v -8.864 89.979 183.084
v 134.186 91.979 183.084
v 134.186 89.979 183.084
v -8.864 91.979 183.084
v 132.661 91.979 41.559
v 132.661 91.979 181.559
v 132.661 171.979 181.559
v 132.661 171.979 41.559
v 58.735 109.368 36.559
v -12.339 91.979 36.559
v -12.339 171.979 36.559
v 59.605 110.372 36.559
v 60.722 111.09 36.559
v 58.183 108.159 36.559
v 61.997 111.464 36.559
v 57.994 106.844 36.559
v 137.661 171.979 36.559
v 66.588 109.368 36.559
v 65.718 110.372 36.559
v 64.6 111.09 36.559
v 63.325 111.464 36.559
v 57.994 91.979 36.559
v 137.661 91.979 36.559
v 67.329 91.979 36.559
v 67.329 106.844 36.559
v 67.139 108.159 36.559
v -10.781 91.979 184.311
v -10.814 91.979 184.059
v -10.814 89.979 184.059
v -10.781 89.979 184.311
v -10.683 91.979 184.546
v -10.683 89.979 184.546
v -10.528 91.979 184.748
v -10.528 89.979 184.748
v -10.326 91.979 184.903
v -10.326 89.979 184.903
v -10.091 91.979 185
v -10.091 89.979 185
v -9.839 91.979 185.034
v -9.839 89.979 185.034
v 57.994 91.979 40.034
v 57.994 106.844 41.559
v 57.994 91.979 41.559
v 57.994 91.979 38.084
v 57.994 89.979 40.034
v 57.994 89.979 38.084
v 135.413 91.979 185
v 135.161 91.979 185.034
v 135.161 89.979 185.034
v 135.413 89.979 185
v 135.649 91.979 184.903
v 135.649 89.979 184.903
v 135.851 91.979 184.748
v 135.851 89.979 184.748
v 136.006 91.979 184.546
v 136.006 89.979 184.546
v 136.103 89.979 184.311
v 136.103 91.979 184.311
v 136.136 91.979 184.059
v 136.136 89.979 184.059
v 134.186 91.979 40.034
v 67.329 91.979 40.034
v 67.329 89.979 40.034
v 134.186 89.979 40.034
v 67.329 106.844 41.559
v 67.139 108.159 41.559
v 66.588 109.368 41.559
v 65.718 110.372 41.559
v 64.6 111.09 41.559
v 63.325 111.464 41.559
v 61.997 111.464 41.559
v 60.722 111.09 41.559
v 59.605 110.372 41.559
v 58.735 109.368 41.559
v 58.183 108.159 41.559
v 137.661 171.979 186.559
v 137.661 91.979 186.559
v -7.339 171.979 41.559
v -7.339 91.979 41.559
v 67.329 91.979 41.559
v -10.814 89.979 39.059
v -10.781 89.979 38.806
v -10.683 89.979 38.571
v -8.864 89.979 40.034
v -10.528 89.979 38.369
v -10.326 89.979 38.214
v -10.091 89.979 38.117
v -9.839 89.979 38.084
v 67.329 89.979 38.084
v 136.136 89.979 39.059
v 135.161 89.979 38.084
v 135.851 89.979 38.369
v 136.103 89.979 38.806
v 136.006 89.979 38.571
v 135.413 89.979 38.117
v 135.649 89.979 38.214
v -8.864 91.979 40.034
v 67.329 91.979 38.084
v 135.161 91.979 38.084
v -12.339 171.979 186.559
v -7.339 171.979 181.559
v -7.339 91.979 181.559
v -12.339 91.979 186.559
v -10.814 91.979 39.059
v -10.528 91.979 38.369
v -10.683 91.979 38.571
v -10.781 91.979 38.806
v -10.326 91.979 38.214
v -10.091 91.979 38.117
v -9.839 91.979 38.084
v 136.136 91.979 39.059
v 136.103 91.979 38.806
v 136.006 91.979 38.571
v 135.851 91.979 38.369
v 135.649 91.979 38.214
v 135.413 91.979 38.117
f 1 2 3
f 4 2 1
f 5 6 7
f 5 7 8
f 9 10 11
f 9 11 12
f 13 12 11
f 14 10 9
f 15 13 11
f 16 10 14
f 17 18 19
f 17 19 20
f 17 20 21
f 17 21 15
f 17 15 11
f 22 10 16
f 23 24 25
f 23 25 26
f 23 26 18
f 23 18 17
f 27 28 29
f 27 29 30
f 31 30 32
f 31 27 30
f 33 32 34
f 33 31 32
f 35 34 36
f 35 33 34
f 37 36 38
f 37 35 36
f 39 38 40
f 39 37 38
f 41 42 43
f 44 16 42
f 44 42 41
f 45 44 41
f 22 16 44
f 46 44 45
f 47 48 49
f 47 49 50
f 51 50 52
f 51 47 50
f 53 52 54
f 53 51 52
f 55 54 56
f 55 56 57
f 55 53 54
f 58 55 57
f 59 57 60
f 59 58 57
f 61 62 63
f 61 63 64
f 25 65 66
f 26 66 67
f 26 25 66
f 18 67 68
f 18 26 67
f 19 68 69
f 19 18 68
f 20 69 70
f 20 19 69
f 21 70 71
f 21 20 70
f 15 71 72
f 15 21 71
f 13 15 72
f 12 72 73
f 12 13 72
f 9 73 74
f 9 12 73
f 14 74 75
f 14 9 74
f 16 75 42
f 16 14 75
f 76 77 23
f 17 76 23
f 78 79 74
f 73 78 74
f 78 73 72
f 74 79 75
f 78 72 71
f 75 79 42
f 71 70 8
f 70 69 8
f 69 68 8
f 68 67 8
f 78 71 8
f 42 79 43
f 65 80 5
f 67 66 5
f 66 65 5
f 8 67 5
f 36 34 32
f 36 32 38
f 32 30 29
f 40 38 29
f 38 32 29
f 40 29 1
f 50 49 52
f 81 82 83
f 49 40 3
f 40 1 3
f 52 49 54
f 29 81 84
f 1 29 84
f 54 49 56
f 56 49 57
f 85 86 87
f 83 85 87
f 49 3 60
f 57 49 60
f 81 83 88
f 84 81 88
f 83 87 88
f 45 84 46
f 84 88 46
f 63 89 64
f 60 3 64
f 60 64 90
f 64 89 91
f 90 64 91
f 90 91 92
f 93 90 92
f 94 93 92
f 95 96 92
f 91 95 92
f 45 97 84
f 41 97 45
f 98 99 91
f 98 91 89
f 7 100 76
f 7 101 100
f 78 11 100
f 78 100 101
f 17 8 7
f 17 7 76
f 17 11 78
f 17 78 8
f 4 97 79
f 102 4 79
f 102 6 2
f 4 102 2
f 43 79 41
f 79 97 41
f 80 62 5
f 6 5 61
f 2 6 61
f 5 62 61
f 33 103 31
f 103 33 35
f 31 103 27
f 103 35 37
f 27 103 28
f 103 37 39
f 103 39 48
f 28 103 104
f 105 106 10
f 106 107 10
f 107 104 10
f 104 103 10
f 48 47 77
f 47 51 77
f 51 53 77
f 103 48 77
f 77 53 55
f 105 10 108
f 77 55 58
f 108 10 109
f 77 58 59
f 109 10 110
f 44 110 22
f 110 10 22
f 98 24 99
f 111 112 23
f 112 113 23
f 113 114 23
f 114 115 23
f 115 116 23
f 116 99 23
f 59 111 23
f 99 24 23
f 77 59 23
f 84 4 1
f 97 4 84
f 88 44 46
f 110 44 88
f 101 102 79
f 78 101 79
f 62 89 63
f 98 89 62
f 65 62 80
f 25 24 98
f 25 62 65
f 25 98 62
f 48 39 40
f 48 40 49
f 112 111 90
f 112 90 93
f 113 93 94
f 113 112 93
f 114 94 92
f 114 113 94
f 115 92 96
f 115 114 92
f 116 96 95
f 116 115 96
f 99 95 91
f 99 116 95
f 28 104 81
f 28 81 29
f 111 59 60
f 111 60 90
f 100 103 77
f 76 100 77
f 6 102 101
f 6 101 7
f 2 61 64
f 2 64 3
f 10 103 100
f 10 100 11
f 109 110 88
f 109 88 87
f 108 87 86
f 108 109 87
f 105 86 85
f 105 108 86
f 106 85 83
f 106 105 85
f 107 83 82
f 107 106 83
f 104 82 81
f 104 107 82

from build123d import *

# Parameters (mm, degrees)
SKETCH1_W           = 150
SKETCH1_H           = 150
SKETCH1_W_2         = 140
SKETCH1_H_2         = 140
BOSS_EXTRUDE1_DEPTH = 80
BOSS_EXTRUDE2_DEPTH = 2
CIRPATTERN1_COUNT   = 4
CUT_EXTRUDE1_DEPTH  = 10


with BuildPart() as part:
    # Sketch1 → Boss-Extrude1 (new body)
    with BuildSketch(Plane(origin=(0, 91.979453816, 0), x_dir=(1, 0, 0), z_dir=(0, 1, 0))):
        with Locations((62.661143414, -111.558685069)):
            Rectangle(SKETCH1_W, SKETCH1_H)
        with Locations((62.661143414, -111.558685069)):
            Rectangle(SKETCH1_W_2, SKETCH1_H_2, mode=Mode.SUBTRACT)
    extrude(amount=BOSS_EXTRUDE1_DEPTH)

    # Sketch5 → Boss-Extrude2 (add)
    with BuildSketch(Plane.XZ.offset(-91.979453816)):
        with BuildLine():
            Line((-8.863856586, 184.058685069), (-8.863856586, 39.058685069))
            ThreePointArc((-8.863856586, 39.058685069), (-9.838856586, 38.083685069), (-10.813856586, 39.058685069))
            Line((-10.813856586, 39.058685069), (-10.813856586, 184.058685069))
            ThreePointArc((-10.813856586, 184.058685069), (-9.838856586, 185.033685069), (-8.863856586, 184.058685069))
        make_face()
    boss_extrude2 = extrude(amount=BOSS_EXTRUDE2_DEPTH)

    # CirPattern1: Boss-Extrude2 ×4 about axis
    cirpattern1_axis = Axis((62.661143414, 0, 111.558685069), (0, 1, 0))
    for i in range(1, CIRPATTERN1_COUNT):
        add(boss_extrude2.rotate(cirpattern1_axis, i * 360 / CIRPATTERN1_COUNT))

    # Sketch6 → Cut-Extrude1 (cut)
    with BuildSketch(Plane(origin=(0, 0, 36.558685069), x_dir=(-1, 0, 0), z_dir=(0, 0, -1))):
        with BuildLine():
            Line((-67.328548343, 91.979453816), (-67.328548343, 106.844407314))
            ThreePointArc((-67.328548343, 106.844407314), (-62.661143414, 111.511812242), (-57.993738486, 106.844407314))
            Line((-57.993738486, 106.844407314), (-57.993738486, 91.979453816))
            Line((-57.993738486, 91.979453816), (-57.993738486, 79.02025395))
            Line((-57.993738486, 79.02025395), (-67.328548343, 79.02025395))
            Line((-67.328548343, 79.02025395), (-67.328548343, 91.979453816))
        make_face()
    extrude(amount=-CUT_EXTRUDE1_DEPTH, mode=Mode.SUBTRACT)


solid = part.part
